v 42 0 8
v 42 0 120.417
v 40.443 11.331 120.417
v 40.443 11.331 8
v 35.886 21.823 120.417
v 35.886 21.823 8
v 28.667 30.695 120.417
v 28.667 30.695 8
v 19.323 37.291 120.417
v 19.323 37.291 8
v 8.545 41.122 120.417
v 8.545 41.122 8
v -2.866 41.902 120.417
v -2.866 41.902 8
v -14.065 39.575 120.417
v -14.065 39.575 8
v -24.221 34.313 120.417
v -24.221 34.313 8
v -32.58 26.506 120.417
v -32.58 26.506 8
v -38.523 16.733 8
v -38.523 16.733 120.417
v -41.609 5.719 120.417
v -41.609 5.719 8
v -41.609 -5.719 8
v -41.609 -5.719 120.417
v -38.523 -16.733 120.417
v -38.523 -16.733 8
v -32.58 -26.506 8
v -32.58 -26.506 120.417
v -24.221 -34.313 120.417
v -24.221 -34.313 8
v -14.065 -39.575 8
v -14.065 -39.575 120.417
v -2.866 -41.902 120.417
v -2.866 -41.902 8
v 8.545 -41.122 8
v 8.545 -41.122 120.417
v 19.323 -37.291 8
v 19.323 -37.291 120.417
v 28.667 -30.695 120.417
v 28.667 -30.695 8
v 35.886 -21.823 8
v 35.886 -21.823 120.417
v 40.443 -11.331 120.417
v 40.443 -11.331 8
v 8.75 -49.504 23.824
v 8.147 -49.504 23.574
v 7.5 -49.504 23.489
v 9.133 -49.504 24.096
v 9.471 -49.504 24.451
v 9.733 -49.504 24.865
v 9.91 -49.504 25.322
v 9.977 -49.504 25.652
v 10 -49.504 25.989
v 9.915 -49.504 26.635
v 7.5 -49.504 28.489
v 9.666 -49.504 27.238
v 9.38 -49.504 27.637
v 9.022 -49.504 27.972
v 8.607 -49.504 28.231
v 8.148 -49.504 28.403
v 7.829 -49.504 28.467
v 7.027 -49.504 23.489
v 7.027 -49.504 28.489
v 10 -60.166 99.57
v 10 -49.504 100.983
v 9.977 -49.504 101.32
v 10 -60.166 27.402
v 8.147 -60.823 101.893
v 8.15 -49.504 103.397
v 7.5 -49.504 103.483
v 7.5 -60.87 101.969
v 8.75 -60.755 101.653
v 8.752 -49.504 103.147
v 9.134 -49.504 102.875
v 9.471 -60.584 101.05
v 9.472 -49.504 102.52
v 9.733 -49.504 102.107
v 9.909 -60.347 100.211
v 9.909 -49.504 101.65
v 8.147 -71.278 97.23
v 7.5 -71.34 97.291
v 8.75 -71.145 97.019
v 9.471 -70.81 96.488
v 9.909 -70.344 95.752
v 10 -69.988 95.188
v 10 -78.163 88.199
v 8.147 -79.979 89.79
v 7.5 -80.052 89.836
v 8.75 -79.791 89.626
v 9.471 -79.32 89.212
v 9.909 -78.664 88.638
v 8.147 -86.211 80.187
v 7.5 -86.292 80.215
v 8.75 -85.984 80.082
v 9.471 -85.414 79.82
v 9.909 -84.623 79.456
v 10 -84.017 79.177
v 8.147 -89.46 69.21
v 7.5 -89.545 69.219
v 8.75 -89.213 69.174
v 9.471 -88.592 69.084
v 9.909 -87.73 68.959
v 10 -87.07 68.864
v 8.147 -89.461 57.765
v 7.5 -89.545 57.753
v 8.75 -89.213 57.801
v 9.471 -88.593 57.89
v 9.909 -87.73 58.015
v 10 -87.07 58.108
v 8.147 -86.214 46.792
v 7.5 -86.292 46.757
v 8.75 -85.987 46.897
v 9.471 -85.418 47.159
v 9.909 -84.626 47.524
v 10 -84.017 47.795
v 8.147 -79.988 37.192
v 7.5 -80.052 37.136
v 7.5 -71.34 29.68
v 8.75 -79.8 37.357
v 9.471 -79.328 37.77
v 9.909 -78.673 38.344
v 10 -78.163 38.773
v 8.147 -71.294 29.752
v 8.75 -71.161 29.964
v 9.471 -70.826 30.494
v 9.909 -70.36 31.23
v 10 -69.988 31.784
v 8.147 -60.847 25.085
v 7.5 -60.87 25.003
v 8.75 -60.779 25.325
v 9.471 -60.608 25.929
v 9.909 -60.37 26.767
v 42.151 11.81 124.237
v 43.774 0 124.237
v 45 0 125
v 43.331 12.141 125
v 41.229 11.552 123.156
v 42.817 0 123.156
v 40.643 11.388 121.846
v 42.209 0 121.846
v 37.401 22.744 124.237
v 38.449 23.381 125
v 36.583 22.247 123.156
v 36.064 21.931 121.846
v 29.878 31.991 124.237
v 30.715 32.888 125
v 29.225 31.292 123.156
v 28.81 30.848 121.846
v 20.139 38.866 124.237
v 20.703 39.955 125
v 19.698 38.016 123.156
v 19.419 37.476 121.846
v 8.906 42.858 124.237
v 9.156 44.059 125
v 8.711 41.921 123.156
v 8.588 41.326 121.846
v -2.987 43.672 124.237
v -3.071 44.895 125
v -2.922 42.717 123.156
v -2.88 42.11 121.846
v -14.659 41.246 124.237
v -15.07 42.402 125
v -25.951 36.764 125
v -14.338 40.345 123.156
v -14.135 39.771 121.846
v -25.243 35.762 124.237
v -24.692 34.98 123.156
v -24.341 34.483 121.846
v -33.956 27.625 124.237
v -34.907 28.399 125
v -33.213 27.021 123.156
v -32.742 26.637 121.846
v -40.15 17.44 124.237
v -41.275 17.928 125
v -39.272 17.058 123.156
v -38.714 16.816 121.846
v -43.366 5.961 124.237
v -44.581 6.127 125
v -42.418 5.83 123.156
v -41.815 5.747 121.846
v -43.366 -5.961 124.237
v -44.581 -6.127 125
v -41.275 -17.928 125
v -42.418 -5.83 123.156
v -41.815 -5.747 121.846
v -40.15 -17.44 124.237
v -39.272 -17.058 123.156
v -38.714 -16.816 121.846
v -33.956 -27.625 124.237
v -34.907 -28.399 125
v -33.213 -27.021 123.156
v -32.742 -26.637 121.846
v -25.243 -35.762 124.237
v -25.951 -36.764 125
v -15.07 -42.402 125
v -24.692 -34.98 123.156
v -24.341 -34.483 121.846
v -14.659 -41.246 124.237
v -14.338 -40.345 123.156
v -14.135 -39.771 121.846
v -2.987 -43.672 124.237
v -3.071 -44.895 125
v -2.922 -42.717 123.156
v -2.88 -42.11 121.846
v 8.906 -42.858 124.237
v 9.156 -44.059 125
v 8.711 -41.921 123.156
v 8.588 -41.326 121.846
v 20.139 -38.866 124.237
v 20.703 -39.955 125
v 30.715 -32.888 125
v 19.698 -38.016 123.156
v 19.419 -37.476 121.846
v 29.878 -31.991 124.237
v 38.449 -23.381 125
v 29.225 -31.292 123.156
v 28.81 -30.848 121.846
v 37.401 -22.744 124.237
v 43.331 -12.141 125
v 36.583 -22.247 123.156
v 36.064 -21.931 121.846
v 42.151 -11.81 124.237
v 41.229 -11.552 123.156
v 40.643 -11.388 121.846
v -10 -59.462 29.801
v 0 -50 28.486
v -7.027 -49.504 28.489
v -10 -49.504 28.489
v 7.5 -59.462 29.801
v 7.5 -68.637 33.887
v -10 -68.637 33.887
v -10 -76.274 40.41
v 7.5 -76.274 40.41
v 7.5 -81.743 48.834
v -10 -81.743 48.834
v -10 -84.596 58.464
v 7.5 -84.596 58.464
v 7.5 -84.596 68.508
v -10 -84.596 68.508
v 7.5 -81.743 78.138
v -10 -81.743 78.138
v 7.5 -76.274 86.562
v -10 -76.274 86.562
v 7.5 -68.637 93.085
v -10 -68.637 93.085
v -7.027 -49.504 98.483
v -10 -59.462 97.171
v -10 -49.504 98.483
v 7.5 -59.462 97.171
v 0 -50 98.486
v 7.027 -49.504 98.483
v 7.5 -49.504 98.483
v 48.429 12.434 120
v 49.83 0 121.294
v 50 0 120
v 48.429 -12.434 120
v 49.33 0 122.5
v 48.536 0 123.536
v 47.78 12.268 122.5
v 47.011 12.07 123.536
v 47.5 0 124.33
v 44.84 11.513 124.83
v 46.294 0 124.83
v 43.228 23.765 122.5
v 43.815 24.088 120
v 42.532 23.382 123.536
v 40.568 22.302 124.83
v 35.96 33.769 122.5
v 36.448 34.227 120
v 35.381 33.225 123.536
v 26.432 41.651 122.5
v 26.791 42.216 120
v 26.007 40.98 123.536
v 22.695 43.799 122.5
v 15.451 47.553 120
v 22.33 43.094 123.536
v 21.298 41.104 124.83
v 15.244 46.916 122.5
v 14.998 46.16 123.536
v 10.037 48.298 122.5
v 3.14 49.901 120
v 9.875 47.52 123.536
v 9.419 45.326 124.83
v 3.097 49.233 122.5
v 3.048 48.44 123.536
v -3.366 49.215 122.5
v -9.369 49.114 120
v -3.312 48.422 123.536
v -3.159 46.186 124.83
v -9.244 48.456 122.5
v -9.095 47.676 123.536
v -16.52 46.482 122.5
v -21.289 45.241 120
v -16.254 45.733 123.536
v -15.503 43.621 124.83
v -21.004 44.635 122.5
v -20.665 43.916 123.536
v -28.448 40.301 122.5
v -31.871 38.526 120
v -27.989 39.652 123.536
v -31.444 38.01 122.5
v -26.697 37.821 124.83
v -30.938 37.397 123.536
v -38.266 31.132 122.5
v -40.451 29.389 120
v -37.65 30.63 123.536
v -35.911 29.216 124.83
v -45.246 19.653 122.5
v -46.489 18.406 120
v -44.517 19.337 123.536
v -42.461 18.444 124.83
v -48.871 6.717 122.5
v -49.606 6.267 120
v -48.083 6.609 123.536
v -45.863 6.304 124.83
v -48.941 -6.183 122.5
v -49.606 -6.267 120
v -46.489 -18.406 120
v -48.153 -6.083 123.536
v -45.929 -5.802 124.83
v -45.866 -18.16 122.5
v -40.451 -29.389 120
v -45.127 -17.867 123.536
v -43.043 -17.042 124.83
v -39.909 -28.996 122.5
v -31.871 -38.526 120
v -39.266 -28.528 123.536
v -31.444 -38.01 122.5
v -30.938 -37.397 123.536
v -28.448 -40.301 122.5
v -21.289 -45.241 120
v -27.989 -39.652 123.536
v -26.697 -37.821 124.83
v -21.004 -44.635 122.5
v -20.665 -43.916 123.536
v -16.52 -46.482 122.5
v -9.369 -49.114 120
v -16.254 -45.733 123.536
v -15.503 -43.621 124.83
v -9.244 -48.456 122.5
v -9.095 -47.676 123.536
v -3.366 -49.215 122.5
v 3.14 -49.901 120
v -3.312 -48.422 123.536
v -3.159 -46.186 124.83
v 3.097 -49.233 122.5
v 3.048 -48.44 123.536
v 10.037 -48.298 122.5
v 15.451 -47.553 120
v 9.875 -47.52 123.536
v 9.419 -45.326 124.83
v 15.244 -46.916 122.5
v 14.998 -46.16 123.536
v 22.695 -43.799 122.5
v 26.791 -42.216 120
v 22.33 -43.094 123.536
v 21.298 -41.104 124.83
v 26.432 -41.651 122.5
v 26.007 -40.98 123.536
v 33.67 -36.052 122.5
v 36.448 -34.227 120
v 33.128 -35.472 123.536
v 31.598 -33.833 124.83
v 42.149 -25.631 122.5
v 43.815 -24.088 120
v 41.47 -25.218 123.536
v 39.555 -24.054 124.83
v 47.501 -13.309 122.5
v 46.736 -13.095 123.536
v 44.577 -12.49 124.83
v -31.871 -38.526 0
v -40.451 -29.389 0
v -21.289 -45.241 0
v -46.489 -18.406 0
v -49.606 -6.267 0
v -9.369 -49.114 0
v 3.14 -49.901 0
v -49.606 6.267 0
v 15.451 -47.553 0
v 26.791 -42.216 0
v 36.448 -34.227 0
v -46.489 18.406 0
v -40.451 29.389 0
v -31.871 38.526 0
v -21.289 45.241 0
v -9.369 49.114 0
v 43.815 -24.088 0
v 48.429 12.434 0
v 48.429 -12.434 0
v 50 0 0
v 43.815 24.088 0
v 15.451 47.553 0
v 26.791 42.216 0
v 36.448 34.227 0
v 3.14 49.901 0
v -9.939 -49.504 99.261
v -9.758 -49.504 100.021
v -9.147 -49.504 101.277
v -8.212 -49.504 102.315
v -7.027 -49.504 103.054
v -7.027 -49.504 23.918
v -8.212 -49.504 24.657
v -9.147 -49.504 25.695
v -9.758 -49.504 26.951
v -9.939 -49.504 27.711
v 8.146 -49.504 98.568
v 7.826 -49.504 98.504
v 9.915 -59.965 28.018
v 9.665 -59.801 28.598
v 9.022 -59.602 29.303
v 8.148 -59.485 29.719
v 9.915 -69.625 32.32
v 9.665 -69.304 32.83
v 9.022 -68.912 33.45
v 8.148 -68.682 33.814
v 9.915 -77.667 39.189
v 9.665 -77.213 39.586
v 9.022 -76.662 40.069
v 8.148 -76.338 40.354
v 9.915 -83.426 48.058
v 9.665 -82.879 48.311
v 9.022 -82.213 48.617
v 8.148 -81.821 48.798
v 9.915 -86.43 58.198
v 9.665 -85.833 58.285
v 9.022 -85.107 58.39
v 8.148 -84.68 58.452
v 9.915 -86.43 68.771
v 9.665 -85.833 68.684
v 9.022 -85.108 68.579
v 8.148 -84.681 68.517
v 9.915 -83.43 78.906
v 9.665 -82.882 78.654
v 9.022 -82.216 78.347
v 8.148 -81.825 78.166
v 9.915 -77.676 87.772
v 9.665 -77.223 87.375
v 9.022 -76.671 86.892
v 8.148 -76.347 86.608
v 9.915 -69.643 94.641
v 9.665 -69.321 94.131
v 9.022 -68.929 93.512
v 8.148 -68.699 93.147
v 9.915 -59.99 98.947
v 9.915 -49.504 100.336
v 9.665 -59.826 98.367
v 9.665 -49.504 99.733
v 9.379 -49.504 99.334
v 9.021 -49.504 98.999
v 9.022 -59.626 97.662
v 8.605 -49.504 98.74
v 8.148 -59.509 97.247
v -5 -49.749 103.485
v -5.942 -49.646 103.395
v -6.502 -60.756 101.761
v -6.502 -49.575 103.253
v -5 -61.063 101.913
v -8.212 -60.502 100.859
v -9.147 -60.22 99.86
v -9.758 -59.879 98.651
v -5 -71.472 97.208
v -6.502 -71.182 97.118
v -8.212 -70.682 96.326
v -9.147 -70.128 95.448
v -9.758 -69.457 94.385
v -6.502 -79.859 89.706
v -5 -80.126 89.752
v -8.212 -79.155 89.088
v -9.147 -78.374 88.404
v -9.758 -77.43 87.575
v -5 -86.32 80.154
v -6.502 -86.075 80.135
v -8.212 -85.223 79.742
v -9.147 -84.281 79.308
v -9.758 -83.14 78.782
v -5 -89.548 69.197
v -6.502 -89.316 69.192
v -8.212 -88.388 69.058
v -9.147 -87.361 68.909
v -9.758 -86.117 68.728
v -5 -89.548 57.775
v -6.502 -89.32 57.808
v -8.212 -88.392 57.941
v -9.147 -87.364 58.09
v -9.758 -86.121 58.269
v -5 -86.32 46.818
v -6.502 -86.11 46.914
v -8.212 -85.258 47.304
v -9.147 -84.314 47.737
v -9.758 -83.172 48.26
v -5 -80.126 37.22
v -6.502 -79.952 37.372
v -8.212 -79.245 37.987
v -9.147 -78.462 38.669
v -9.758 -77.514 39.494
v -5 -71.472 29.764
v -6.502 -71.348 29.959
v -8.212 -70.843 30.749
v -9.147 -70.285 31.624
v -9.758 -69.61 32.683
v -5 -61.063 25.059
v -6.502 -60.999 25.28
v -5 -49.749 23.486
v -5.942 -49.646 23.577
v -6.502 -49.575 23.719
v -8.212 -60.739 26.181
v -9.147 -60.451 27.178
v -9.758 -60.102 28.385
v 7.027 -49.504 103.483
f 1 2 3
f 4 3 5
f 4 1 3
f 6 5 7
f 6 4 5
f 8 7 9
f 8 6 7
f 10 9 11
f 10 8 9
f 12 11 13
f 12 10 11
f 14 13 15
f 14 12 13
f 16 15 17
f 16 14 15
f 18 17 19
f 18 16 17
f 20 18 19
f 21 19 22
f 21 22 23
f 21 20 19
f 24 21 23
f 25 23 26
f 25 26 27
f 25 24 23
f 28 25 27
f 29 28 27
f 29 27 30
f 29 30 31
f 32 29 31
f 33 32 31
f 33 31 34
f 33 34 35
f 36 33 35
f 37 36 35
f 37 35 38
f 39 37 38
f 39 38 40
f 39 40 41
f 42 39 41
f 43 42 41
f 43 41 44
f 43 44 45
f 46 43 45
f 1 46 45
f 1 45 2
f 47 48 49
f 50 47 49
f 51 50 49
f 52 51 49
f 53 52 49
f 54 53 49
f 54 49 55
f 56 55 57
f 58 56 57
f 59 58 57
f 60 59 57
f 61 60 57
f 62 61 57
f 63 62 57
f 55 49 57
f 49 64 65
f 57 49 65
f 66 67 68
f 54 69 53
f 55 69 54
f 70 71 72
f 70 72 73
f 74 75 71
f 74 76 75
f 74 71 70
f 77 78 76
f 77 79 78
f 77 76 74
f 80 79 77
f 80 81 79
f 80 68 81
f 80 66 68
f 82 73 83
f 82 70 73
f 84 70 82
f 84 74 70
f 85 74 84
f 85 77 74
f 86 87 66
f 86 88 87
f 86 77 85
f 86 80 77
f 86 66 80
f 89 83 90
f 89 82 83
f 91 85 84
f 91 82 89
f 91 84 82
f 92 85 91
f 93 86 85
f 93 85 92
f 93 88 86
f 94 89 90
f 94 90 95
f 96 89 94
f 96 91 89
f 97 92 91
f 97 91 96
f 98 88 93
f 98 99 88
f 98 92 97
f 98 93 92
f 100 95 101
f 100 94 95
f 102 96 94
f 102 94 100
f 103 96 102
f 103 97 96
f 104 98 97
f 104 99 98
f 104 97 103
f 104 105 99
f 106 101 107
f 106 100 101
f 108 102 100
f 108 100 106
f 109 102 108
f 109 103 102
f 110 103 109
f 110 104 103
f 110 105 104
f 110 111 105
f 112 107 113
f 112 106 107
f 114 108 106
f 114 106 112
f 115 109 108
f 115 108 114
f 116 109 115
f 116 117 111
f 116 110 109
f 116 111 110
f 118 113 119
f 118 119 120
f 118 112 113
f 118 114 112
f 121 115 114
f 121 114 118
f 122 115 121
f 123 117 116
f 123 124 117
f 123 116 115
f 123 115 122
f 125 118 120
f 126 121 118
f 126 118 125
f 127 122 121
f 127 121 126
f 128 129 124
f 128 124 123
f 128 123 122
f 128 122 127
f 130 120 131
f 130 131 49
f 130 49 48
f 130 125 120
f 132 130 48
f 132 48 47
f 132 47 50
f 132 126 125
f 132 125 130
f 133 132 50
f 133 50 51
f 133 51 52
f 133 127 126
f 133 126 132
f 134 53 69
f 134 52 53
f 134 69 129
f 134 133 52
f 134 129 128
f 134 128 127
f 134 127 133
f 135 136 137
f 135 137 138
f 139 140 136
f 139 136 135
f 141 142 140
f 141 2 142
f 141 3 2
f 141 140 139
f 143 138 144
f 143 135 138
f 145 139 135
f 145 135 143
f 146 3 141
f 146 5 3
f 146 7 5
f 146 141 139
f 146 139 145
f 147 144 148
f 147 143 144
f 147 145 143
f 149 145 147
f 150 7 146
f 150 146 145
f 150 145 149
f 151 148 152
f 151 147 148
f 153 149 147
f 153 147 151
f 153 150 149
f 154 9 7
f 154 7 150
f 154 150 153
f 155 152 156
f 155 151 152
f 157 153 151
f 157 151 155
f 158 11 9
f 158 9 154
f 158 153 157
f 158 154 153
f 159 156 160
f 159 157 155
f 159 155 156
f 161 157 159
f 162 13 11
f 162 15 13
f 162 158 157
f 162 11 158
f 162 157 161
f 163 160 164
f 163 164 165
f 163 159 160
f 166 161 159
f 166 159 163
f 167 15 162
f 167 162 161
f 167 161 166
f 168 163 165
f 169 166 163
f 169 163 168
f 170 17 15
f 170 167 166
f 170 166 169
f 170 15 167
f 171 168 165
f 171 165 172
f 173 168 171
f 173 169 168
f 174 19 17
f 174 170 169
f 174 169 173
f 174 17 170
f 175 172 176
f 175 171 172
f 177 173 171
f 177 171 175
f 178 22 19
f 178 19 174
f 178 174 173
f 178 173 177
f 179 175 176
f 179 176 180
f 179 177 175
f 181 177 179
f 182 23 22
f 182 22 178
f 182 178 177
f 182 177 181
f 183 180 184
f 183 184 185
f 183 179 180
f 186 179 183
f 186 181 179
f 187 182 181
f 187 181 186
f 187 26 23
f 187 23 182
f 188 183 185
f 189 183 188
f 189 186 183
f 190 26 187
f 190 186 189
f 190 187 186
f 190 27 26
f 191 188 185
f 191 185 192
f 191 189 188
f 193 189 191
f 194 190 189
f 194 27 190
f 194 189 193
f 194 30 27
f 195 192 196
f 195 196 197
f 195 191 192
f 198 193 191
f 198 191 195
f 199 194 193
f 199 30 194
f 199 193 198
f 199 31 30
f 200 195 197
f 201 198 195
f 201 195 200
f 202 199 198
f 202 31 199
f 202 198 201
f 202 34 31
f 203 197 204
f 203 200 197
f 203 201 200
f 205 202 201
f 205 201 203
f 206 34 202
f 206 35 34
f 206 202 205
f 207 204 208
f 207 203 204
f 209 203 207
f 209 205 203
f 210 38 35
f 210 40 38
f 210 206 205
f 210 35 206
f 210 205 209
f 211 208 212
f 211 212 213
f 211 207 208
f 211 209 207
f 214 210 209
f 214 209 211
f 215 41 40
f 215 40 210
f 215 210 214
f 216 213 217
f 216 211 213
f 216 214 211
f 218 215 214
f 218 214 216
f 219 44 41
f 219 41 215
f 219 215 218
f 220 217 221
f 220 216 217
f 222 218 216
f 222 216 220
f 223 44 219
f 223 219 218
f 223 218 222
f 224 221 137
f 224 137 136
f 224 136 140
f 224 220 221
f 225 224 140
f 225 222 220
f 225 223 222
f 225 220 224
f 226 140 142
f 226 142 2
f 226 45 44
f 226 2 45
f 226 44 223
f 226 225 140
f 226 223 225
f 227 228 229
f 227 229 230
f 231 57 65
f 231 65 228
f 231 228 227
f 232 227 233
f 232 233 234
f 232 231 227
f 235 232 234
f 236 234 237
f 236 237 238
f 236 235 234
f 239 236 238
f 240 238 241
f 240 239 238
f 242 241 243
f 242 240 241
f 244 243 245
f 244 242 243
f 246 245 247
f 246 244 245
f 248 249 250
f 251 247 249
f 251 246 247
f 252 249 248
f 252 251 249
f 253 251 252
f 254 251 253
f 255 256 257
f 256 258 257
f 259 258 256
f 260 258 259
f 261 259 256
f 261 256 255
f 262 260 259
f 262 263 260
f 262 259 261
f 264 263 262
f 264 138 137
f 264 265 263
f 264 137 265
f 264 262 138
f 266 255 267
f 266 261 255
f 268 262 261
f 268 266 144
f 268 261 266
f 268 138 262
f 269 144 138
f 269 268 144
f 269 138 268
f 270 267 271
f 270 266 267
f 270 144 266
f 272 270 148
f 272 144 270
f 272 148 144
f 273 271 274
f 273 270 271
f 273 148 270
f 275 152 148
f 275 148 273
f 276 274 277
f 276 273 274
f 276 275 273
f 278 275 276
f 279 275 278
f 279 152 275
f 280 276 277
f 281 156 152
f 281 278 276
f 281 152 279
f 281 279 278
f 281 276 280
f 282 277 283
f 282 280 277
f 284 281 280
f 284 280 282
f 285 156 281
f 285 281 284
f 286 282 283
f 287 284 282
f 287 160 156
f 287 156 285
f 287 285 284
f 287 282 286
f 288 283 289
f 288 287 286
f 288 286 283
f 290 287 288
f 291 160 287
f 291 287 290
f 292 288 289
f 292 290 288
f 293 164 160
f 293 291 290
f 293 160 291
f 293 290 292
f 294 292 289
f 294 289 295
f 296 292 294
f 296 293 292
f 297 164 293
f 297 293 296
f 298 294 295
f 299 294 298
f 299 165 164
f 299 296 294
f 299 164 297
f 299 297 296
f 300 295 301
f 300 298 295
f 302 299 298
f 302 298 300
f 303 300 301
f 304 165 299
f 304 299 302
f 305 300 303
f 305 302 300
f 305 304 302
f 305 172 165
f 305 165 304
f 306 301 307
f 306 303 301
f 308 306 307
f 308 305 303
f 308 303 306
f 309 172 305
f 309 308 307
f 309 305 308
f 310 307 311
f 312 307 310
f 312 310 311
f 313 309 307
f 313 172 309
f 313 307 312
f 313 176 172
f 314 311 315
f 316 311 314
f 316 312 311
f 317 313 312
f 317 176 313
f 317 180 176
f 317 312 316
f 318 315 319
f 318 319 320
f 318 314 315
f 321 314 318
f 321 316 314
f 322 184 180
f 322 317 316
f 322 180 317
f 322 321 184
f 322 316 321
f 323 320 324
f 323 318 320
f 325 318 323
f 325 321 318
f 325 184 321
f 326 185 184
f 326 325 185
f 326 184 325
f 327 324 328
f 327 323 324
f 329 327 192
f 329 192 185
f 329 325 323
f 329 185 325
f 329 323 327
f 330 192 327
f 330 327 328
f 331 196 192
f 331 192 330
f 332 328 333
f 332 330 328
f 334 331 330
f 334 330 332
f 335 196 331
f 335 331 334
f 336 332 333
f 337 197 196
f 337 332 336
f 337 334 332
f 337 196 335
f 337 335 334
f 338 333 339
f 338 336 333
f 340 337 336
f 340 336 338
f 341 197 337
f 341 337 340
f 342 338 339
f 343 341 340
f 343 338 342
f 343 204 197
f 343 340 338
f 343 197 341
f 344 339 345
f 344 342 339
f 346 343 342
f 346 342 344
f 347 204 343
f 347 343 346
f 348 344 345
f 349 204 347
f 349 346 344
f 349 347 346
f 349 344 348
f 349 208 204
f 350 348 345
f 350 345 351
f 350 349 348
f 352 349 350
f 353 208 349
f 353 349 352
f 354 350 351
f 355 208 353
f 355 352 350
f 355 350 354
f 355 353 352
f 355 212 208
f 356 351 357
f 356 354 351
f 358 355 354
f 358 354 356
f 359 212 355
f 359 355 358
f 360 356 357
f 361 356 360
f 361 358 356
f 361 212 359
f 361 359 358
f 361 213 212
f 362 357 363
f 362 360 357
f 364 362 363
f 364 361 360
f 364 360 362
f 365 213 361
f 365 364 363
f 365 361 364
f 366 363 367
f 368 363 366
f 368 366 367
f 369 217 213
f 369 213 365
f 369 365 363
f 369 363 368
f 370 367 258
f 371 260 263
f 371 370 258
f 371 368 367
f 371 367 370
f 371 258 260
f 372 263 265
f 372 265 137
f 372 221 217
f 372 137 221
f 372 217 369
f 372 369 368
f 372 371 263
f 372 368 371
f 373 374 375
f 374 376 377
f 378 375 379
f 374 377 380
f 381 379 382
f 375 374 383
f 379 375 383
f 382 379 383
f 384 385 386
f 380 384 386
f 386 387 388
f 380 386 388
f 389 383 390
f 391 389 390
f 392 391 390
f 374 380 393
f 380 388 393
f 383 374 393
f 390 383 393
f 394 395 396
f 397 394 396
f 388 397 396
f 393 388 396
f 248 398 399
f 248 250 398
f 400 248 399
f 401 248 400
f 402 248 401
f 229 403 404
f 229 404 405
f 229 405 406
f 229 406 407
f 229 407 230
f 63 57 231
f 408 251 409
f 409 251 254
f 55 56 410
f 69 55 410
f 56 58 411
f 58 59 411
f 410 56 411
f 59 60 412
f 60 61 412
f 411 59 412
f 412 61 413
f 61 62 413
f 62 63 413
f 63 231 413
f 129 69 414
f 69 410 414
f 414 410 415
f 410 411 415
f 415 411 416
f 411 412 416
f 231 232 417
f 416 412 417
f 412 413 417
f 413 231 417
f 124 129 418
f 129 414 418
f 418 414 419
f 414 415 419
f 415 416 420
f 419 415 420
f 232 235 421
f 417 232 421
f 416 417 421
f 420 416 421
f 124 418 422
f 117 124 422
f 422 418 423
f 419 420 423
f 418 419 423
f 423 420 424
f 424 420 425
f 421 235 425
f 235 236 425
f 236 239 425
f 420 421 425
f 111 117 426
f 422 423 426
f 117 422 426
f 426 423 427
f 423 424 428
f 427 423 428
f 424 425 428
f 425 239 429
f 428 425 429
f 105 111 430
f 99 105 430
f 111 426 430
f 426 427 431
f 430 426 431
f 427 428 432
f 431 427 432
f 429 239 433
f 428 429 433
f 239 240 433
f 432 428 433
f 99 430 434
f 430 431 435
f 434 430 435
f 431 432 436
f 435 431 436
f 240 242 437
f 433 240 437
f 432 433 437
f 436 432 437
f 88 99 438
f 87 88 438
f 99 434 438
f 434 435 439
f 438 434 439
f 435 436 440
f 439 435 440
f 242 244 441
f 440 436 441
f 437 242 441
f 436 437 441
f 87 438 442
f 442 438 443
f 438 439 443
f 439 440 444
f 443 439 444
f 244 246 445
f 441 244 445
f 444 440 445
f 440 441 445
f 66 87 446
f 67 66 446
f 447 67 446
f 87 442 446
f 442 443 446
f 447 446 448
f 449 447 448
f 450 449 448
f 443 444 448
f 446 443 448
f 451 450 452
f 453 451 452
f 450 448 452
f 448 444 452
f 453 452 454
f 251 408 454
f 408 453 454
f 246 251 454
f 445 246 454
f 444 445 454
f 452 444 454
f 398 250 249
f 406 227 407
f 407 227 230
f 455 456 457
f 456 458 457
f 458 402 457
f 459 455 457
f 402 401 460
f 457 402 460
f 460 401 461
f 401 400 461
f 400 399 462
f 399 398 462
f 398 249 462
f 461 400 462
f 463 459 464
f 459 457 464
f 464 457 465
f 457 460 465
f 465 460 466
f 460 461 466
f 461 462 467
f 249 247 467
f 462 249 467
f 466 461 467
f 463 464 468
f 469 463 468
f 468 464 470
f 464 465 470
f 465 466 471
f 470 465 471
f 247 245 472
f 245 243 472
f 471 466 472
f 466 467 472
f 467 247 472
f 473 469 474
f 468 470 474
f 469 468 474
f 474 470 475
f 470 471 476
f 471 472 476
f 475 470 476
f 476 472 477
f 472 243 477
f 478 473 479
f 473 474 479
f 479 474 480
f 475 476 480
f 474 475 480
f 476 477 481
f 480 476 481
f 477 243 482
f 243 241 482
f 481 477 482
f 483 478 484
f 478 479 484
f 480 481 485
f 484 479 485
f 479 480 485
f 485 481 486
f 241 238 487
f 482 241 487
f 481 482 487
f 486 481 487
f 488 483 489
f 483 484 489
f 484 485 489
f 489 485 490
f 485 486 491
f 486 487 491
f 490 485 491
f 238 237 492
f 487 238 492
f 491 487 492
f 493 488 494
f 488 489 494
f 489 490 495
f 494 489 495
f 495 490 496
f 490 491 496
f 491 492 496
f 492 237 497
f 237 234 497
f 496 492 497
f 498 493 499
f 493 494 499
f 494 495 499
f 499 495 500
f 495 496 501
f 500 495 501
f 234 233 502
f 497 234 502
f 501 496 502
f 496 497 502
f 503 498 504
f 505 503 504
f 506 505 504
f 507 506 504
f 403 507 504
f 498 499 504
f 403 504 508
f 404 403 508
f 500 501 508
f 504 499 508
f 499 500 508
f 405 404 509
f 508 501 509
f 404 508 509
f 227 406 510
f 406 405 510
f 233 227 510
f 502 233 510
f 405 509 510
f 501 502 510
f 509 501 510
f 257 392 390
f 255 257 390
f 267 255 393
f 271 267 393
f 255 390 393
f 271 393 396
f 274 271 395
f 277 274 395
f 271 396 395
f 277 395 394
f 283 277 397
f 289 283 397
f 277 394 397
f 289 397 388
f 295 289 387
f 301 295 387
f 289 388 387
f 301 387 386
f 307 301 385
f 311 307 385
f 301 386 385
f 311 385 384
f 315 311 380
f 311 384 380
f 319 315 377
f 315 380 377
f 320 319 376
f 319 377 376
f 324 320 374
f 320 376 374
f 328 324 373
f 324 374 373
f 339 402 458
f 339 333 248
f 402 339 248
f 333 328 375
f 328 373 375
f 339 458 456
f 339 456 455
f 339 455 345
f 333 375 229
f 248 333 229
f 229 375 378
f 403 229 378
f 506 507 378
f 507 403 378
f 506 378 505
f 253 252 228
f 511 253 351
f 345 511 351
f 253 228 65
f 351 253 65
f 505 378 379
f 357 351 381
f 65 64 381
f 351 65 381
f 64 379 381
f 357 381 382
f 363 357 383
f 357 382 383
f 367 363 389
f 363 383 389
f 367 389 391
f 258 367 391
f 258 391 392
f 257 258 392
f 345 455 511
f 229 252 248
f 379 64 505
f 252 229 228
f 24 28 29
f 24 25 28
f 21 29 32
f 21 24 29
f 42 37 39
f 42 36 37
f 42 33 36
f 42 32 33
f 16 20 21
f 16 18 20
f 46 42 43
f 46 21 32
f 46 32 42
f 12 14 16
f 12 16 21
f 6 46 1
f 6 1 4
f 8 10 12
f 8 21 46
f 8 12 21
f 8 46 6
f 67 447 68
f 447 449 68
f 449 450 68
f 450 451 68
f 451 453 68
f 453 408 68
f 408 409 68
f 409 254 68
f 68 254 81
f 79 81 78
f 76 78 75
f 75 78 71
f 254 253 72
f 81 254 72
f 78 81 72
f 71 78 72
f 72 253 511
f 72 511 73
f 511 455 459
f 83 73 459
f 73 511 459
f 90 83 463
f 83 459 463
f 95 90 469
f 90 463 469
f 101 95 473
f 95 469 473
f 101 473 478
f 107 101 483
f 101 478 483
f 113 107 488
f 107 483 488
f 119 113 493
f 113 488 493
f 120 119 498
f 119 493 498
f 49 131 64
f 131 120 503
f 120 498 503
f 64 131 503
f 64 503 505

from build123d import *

# Parameters (mm, degrees)
F0_R          = 50
F1_DEPTH      = 125
F2_T          = -8
F3_R          = 5
F6_DEPTH      = 10
F6_DEPTH_BACK = 10
F7_R          = 2.5
F8_R          = 2.49999
F9_R          = 4.99999


# Not quite as in the source:
# - a fillet or chamfer that OpenCascade refuses, or shapes differently, is made with other operations: its cross-section is extruded or revolved along the edge and cut away or added
# - a fillet or chamfer is up to 0.001 mm smaller than in the source, because OpenCascade refuses the exact size


with BuildPart() as f1:
    # F0 (on Top) → F1 (new body)
    with BuildSketch(Plane.XY):
        Circle(F0_R)
    extrude(amount=F1_DEPTH)

    # F2
    f2_openings = [f1.faces().sort_by_distance(p)[0] for p in [
        (0, 0, 125),
    ]]
    offset(amount=F2_T, openings=f2_openings)

    # F3
    f3_edges = [f1.edges().sort_by_distance(p)[0] for p in [
        (-50, 0, 125),
    ]]
    fillet(f3_edges, radius=F3_R)

    # F4: fillet of radius 5 on 1 edges, made by hand

    # F4_s1 → F4_t2 (revolve, cut)
    with BuildSketch(Plane.XZ):
        with BuildLine():
            ThreePointArc((45, 125), (42.8166998673, 123.1560370926), (42, 120.417424305))
            Line((42, 120.417424305), (42, 125))
            Line((42, 125), (45, 125))
        make_face()
    revolve(axis=Axis((0, 0, 125), (0, 0, 1)), mode=Mode.SUBTRACT)

    # F5 (on Right) → F6 (join, two sides)
    with BuildSketch(Plane.YZ) as f6_sk:
        with BuildLine():
            ThreePointArc((-49.5038208311, 28.4888988916), (-84.9579082425, 63.4859531194), (-49.5038208311, 98.4830073472))
            Line((-49.5038208311, 98.4830073472), (-49.5038208311, 103.4833755941))
            ThreePointArc((-49.5038208311, 103.4833755941), (-89.9579082425, 63.4859531194), (-49.5038208311, 23.4885306446))
            Line((-49.5038208311, 23.4885306446), (-49.5038208311, 28.4888988916))
        make_face()
    extrude(amount=F6_DEPTH)
    extrude(f6_sk.sketch, amount=-F6_DEPTH_BACK)

    # F7
    f7_edges = [f1.edges().sort_by_distance(p)[0] for p in [
        (10, -89.957908, 63.485953),
    ]]
    fillet(f7_edges, radius=F7_R)

    # F8 (radius 2.5 in the source; OpenCascade refuses exactly that, so slightly less here)
    f8_edges = [f1.edges().sort_by_distance(p)[0] for p in [
        (10, -84.957908, 63.485953),
    ]]
    fillet(f8_edges, radius=F8_R)

    # F9 (radius 5 in the source; OpenCascade refuses exactly that, so slightly less here)
    f9_edges = [f1.edges().sort_by_distance(p)[0] for p in [
        (-10, -89.957908, 63.485953),
    ]]
    fillet(f9_edges, radius=F9_R)


solid = f1.part
